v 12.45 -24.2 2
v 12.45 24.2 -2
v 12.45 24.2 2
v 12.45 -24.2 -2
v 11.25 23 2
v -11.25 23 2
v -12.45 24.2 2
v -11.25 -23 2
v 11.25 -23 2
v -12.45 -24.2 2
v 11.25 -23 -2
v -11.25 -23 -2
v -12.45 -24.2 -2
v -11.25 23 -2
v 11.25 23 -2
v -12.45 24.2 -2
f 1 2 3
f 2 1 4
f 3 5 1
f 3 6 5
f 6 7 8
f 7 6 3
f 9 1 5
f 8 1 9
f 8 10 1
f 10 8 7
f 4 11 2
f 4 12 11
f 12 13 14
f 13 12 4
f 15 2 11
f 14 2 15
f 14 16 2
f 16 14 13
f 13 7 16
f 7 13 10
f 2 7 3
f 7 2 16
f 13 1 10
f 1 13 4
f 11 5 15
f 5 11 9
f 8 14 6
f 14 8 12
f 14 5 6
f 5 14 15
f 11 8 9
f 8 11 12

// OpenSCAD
height = 4;
innerLength = 46;
innerWidth = 22.5;
walls = 1.2;

difference() {
    cube([innerWidth + walls*2, innerLength + walls*2, height], center=true);
    cube([innerWidth, innerLength, height], center=true);
}
